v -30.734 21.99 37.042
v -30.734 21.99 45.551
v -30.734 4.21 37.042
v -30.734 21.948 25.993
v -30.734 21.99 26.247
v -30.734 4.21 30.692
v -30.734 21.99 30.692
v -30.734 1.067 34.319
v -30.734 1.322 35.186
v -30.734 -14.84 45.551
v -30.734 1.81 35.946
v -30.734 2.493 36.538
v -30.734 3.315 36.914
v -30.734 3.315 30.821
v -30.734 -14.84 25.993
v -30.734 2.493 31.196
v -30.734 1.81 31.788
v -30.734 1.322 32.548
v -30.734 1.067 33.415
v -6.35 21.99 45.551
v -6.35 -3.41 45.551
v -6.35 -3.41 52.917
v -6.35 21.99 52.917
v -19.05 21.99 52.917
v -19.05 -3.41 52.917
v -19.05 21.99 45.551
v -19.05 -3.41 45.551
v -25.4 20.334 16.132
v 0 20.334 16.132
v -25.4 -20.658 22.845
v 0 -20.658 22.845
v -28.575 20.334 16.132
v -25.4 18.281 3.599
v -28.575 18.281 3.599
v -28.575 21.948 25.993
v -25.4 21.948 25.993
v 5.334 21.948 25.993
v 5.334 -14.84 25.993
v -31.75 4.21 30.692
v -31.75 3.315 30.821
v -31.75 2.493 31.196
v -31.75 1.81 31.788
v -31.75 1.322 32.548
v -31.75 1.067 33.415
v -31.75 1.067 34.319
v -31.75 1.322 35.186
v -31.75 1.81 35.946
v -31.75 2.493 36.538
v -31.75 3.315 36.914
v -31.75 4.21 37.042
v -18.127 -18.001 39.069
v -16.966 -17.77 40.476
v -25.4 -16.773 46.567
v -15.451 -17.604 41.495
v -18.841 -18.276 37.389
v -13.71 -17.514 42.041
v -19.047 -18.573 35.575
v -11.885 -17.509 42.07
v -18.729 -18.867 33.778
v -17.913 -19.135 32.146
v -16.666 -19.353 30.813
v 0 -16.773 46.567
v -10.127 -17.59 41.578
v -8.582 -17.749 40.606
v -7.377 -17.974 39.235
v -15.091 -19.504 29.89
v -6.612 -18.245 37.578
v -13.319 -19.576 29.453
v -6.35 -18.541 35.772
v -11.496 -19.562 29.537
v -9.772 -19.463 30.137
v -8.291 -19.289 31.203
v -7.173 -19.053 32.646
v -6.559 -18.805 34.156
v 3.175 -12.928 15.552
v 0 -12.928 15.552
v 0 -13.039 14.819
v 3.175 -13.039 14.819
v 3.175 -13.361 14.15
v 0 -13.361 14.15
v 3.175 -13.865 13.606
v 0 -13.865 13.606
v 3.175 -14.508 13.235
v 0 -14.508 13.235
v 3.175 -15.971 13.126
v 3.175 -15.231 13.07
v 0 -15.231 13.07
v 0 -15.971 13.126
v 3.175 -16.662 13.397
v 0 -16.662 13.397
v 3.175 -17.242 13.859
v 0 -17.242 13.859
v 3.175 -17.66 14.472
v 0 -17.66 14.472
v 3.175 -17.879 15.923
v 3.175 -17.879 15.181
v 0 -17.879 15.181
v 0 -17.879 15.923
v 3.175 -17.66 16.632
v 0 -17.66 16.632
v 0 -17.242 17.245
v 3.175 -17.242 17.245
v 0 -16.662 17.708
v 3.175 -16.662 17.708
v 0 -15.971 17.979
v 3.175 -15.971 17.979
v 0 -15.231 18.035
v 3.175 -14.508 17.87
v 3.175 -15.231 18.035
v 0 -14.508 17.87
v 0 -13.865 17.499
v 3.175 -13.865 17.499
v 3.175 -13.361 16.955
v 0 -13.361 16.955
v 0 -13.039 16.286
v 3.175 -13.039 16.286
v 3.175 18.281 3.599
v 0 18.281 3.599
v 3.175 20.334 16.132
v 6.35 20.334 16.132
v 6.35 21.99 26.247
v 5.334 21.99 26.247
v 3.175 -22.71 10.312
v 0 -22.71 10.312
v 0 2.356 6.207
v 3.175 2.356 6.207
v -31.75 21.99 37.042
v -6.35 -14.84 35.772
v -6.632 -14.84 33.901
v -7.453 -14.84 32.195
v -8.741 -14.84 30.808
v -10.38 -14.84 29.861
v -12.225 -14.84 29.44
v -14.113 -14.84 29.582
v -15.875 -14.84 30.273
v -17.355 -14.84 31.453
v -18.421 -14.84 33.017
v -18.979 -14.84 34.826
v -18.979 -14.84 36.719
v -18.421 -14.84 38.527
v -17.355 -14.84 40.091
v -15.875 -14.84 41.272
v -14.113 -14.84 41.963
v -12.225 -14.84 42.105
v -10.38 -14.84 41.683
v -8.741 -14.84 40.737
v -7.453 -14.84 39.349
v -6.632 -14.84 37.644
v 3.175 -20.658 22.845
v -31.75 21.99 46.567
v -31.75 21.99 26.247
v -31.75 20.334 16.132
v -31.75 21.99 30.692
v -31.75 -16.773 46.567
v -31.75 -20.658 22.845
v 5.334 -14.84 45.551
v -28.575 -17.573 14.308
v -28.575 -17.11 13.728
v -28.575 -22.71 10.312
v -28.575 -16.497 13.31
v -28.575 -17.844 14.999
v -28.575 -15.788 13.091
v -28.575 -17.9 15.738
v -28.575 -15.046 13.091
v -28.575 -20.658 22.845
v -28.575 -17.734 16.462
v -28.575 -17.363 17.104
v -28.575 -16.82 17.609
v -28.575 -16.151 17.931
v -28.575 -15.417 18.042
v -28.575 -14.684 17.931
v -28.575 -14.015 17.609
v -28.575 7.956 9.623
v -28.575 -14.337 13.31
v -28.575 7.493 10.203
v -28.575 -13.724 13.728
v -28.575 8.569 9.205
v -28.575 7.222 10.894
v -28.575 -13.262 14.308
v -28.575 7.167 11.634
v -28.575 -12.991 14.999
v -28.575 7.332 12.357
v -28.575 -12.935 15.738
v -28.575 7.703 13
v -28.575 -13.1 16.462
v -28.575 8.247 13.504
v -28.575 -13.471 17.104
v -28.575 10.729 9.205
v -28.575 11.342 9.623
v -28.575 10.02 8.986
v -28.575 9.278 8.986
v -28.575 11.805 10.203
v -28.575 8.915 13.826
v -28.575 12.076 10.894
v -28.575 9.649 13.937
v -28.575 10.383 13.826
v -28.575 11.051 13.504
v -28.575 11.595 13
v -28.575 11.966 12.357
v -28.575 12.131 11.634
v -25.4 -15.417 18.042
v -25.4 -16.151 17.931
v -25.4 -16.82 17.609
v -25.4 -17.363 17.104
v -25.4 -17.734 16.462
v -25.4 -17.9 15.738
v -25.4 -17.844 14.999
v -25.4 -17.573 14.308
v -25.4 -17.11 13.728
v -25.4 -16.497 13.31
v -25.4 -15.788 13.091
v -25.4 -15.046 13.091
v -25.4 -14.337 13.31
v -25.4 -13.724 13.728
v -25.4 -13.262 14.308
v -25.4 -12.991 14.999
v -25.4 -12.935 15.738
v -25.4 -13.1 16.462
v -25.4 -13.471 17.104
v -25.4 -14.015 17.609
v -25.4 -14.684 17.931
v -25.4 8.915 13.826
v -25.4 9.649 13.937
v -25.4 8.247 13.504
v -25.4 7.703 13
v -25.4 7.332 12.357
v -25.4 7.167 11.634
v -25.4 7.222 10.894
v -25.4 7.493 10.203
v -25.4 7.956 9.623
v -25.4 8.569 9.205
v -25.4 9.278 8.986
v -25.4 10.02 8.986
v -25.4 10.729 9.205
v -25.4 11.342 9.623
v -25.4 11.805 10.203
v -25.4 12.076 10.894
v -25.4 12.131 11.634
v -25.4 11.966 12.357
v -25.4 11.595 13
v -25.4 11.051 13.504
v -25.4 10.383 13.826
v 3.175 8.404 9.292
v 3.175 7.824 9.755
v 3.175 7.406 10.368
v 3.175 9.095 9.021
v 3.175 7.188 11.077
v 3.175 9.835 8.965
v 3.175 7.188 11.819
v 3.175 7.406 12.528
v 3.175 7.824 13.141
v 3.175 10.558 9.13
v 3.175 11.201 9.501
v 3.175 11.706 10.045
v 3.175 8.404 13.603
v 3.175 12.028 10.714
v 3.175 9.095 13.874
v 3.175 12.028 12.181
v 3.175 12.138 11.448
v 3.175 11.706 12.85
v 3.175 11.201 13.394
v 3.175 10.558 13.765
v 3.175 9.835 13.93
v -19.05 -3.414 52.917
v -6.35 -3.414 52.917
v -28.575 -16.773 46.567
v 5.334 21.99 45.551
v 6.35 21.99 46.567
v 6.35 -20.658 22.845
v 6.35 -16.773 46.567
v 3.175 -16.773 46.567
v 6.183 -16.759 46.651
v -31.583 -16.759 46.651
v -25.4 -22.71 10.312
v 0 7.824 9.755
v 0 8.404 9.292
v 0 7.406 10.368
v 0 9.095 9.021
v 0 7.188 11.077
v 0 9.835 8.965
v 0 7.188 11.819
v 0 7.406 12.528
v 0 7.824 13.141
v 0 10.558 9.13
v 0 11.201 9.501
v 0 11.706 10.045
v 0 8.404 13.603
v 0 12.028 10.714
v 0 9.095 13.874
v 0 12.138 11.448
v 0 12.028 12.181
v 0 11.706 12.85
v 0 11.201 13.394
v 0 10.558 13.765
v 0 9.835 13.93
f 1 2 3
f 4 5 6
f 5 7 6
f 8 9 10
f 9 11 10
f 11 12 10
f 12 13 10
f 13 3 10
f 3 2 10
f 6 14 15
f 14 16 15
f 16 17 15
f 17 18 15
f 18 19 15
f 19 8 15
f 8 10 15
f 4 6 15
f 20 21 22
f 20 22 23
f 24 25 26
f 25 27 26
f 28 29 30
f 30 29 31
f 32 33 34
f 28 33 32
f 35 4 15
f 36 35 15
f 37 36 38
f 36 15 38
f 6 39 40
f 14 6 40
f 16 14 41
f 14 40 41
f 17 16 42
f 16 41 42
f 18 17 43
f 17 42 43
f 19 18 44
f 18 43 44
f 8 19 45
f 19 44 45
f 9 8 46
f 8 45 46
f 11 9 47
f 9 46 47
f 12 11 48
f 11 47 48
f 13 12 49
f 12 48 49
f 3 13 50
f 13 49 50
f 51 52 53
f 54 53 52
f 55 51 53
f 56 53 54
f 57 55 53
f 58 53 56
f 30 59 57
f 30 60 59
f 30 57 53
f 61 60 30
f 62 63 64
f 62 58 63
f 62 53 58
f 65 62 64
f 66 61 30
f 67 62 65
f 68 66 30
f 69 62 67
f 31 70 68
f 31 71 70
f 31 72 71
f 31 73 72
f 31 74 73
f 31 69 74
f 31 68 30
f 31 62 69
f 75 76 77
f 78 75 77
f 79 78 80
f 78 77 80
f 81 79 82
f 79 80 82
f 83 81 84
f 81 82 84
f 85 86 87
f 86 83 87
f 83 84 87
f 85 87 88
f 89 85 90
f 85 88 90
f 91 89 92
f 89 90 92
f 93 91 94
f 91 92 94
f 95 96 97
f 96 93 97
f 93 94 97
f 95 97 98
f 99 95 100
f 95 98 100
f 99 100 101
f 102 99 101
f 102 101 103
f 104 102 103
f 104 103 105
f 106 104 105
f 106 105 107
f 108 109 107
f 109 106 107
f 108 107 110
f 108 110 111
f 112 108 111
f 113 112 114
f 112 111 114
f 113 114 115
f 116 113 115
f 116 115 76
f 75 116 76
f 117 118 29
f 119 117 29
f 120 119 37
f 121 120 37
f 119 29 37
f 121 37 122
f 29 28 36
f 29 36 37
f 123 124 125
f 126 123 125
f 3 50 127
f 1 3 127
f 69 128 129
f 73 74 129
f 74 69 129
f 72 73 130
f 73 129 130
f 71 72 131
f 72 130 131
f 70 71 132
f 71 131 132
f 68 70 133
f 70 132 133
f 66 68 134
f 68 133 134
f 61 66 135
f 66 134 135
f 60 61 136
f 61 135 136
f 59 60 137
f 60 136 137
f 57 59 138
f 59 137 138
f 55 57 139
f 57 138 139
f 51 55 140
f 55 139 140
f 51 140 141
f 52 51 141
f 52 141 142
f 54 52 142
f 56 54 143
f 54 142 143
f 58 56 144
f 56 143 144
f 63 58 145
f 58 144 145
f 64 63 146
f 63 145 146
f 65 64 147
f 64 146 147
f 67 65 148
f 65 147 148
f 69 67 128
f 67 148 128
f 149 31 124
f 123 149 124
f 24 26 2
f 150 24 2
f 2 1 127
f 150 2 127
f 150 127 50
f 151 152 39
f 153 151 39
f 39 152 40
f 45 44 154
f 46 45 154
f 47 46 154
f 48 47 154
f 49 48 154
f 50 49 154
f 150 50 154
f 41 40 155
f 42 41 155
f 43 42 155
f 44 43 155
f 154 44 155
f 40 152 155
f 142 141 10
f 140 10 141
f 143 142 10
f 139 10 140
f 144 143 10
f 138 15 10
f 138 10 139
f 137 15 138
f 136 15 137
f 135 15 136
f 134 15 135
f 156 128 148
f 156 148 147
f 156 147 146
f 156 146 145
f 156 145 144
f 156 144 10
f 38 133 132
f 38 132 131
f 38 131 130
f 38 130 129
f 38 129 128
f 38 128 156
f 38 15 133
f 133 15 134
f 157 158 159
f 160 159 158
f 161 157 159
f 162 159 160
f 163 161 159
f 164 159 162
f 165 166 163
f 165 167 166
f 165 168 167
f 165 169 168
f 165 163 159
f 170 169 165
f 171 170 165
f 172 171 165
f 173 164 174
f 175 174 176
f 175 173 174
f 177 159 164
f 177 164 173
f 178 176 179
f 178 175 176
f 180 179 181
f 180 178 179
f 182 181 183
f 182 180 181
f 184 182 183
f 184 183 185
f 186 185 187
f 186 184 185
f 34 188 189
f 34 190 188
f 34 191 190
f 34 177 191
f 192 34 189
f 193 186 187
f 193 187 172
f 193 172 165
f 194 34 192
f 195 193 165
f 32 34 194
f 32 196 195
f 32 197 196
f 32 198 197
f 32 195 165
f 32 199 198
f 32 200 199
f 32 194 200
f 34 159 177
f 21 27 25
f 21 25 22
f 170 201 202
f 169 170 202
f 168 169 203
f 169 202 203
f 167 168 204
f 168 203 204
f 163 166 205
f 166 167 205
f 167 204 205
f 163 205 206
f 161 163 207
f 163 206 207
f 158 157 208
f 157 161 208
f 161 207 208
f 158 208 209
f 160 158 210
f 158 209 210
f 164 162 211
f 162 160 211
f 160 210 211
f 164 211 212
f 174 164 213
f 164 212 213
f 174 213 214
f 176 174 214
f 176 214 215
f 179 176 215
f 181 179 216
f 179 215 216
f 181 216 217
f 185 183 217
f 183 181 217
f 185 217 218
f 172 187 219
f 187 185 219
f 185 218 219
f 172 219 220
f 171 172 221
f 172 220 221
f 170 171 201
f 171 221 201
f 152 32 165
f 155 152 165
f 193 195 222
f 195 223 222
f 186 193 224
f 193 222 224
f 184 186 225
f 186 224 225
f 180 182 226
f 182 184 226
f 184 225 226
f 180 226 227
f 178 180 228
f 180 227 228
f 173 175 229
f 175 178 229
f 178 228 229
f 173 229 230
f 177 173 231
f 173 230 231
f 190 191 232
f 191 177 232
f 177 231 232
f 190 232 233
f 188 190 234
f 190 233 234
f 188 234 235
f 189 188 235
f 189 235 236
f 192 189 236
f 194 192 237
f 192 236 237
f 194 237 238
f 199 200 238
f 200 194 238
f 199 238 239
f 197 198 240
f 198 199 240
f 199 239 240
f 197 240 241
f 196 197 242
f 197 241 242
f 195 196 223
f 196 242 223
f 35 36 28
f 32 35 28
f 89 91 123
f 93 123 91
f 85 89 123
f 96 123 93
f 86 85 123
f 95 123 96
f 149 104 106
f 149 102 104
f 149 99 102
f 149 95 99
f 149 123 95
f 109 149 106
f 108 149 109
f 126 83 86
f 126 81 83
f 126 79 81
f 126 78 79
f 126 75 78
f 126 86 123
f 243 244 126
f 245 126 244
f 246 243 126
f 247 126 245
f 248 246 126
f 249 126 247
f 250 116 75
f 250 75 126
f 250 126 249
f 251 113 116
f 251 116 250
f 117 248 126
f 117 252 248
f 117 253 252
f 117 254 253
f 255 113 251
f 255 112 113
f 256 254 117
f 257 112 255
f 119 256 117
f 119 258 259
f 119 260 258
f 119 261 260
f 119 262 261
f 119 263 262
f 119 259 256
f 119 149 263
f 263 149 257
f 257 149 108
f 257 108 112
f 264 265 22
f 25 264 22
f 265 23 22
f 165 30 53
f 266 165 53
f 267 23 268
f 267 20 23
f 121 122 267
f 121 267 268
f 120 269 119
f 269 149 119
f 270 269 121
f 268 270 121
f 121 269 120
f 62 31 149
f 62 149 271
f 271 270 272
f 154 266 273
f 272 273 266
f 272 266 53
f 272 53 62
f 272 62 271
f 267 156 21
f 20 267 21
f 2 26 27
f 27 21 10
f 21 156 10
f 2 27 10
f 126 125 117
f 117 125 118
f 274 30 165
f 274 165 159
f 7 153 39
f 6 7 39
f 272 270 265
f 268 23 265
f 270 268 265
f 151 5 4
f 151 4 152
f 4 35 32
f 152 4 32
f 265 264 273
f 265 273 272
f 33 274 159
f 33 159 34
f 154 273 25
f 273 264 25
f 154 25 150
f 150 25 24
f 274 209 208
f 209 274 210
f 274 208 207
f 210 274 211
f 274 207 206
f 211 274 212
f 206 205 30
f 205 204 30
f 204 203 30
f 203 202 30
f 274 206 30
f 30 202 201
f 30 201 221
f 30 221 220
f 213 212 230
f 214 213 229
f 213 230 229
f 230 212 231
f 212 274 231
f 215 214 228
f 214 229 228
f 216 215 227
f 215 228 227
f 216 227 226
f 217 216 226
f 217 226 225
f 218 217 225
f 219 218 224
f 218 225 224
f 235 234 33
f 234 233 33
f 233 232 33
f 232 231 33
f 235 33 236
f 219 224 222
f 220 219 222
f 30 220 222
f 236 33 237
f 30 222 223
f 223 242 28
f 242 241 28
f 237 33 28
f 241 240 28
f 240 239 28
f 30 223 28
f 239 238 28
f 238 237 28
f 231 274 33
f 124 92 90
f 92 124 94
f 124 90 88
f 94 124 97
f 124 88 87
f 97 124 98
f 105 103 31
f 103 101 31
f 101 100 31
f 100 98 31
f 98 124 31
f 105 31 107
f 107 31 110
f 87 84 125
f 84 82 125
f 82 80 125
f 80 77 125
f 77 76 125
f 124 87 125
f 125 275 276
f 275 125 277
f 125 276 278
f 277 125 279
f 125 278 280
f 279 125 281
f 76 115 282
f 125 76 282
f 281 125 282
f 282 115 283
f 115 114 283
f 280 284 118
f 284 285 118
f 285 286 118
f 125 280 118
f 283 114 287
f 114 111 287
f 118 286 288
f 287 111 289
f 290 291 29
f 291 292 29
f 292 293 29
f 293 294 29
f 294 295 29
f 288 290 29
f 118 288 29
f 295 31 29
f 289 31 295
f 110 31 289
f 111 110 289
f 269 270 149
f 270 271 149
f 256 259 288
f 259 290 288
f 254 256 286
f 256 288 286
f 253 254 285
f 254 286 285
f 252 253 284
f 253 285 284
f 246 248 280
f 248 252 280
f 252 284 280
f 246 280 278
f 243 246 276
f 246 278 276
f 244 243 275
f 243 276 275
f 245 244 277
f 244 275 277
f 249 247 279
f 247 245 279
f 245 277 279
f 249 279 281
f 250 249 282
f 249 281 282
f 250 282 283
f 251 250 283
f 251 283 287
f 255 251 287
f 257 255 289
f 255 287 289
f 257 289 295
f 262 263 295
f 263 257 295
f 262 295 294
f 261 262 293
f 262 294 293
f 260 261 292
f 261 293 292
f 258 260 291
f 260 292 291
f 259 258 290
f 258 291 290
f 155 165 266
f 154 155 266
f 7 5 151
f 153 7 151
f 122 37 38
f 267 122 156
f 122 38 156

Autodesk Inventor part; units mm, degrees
ref_plane "YZ Plane Vertical Spine" through (0, 0, 0) normal (1, 0, 0) x (0, 1, 0)
ref_plane "XZ Plane Horizontal" through (0, 0, 0) normal (0, 1, 0) x (-1, 0, 0)
ref_plane "XY Plane Vertical Span" through (0, 0, 0) normal (0, 0, 1) x (1, 0, 0)
sketch "Sketch1" plane through (0, 0, 0) normal (1, 0, 0) x (0, 1, 0)
  circle A0 centre (9.6489, 11.4476) radius 2.4892
  line L0 (2.3561, 6.2073) -> (18.2812, 3.5994)
  line L1 (33.7025, 135.9395) -> (135.3025, 135.9395) construction
  line L2 (21.99, 26.2473) -> (-14.84, 26.2473)
  line L3 (4.4085, 18.7403) -> (-20.6576, 22.8451)
  line L4 (-20.6576, 22.8451) -> (-22.71, 10.312)
  line L5 (-22.71, 10.312) -> (2.3561, 6.2073)
  circle A1 centre (-15.4173, 15.5524) radius 2.4892
  line L6 (-14.84, 26.2473) -> (-14.84, 46.5673)
  line L7 (-20.6576, 22.8451) -> (-16.7225, 46.8756)
  line L8 (-16.7225, 46.8756) -> (-14.84, 46.5673)
  line L9 (21.99, 26.2473) -> (18.2812, 3.5994)
  line L10 (20.3336, 16.1325) -> (4.4085, 18.7403)
  dimension "d11" = 12.7
  dimension "d13" = 4.9784
  dimension "d14" = 20.32
extrude "Extrusion1" add sketch "Sketch1" along normal blind 3.175
sketch "Sketch2" plane through (0, 0, 0) normal (-1, 0, 0) x (0, 0, 1)
  line L0 (26.2473, 21.99) -> (26.2473, -14.84) projected
  line L1 (3.5994, 18.2812) -> (26.2473, 21.99) projected
  line L2 (26.2473, -14.84) -> (46.5673, -14.84) projected
  line L3 (46.8756, -16.7225) -> (10.312, -22.71) projected
  line L4 (16.1325, 20.3336) -> (22.8451, -20.6576)
  line L5 (16.1325, 20.3336) -> (26.2473, 21.99)
  line L6 (26.2473, 21.5334) -> (26.2473, -14.84)
  line L7 (26.2473, -14.84) -> (46.5673, -14.84)
  line L8 (46.5673, -14.84) -> (46.8756, -16.7225)
  line L9 (46.8756, -16.7225) -> (22.8451, -20.6576)
extrude "Extrusion2" add sketch "Sketch2" along normal blind 25.4
sketch "Sketch3" plane through (-25.4, 0, 0) normal (-1, 0, 0) x (0, 0, 1)
  line L0 (26.2473, -14.84) -> (26.2473, 21.99) projected
  line L1 (3.5994, 18.2812) -> (16.1325, 20.3336) projected
  line L2 (26.2473, 21.99) -> (16.1325, 20.3336) projected
  line L3 (46.5673, -14.84) -> (26.2473, -14.84) projected
  line L4 (46.8756, -16.7225) -> (46.5673, -14.84) projected
  line L5 (22.8451, -20.6576) -> (46.8756, -16.7225) projected
  line L6 (22.8451, -20.6576) -> (10.312, -22.71) projected
  line L7 (10.312, -22.71) -> (3.5994, 18.2812) projected
  circle A0 centre (15.5524, -15.4173) radius 2.4892 projected
  circle A1 centre (11.4476, 9.6489) radius 2.4892 projected
extrude "Extrusion3" add sketch "Sketch3" along normal blind 3.175
sketch "Sketch4" plane through (-28.575, 0, 0) normal (-1, 0, 0) x (0, 0, 1)
  line L0 (26.2473, 21.99) -> (3.5994, 18.2812) projected
  line L1 (26.2473, -14.84) -> (26.2473, 21.99) projected
  line L2 (46.5673, -14.84) -> (26.2473, -14.84) projected
  line L3 (46.8756, -16.7225) -> (46.5673, -14.84) projected
  line L4 (10.312, -22.71) -> (46.8756, -16.7225) projected
  line L5 (46.8756, -16.7225) -> (46.5673, -14.84) projected
  line L6 (46.5673, -14.84) -> (26.2473, -14.84) projected
  line L7 (26.2473, -14.84) -> (26.2473, 21.99) projected
  line L8 (26.2473, 21.99) -> (3.5994, 18.2812) projected
  line L9 (3.5994, 18.2812) -> (10.312, -22.71) projected
  line L10 (10.312, -22.71) -> (46.8756, -16.7225) projected
  circle A0 centre (11.4476, 9.6489) radius 2.4892 projected
  circle A1 centre (15.5524, -15.4173) radius 2.4892 projected
  line L11 (16.1325, 20.3336) -> (22.8451, -20.6576)
  line L12 (16.1325, 20.3336) -> (26.2473, 21.99)
  line L13 (26.2473, 21.99) -> (26.2473, -14.84)
  line L14 (46.5673, -14.84) -> (26.2473, -14.84)
  line L15 (46.5673, -14.84) -> (46.8756, -16.7225)
  line L16 (46.8756, -16.7225) -> (22.8451, -20.6576)
extrude "Extrusion4" add sketch "Sketch4" along normal blind 3.175 contours L1 L2 L3 L4 L11 L0
sketch "Sketch5" plane through (3.175, 0, 0) normal (1, 0, 0) x (0, 0, -1)
  line L0 (-22.8451, -20.6576) -> (-16.1325, 20.3336) projected
  line L1 (-46.8756, -16.7225) -> (-10.312, -22.71) projected
  line L2 (-26.2473, -14.84) -> (-46.5673, -14.84) projected
  line L3 (-26.2473, 21.99) -> (-26.2473, -14.84) projected
  line L4 (-3.5994, 18.2812) -> (-26.2473, 21.99) projected
  line L5 (-26.2473, 21.99) -> (-16.1325, 20.3336)
  line L6 (-16.1325, 20.3336) -> (-22.8451, -20.6576)
  line L7 (-22.8451, -20.6576) -> (-46.8756, -16.7225)
  line L8 (-46.8756, -16.7225) -> (-46.5673, -14.84)
  line L9 (-46.5673, -14.84) -> (-26.2473, -14.84)
  line L10 (-26.2473, -14.84) -> (-26.2473, 21.99)
extrude "Extrusion5" add sketch "Sketch5" along normal blind 3.175
sketch "Sketch6" plane through (-31.75, -14.84, 46.5673) normal (0, 1, 0) x (1, 0, 0)
  line L0 (38.1, 20.32) -> (38.1, 0) projected
  line L1 (0, 0) -> (0, 20.32) projected
  line L2 (0, 20.32) -> (1.27, 20.32)
  line L3 (0, 0) -> (1.27, 0)
  line L4 (1.27, 0) -> (1.27, 20.32)
  line L5 (38.1, 0) -> (38.1, 20.32)
  line L6 (38.1, 20.32) -> (36.83, 20.32)
  line L7 (36.83, 20.32) -> (36.83, 0)
  line L8 (36.83, 0) -> (38.1, 0)
  dimension "d24" = 1.27
  dimension "d25" = 1.27
  dimension "d26" = 1.27
extrude "Extrusion6" add sketch "Sketch6" along normal blind 36.83
sketch "Sketch7" plane through (-30.48, -14.84, 26.2473) normal (0, 1, 0) x (1, 0, 0)
  line L0 (0, -20.32) -> (35.56, -20.32) projected
  line L1 (0, -19.05) -> (35.56, -19.05)
  line L2 (0, -20.32) -> (35.56, -20.32)
  line L3 (35.56, -19.05) -> (35.56, -20.32)
  line L4 (0, -19.05) -> (0, -20.32)
  dimension "d29" = 1.27
extrude "Extrusion7" add sketch "Sketch7" along normal blind 11.43
sketch "Sketch8" plane through (-30.48, -14.84, 26.2473) normal (1, 0, 0) x (0, 0, -1)
  line L0 (-20.32, 11.43) -> (-20.32, 36.83) projected
  line L1 (-19.05, 11.43) -> (-19.05, 36.83)
  line L2 (-19.05, 36.83) -> (-20.32, 36.83)
  line L3 (-19.05, 11.43) -> (-20.32, 11.43)
  line L4 (-20.32, 11.43) -> (-20.32, 36.83)
  dimension "d32" = 1.27
extrude "Extrusion8" add sketch "Sketch8" along normal blind 11.43
sketch "Sketch9" plane through (5.08, -14.84, 26.2473) normal (-1, 0, 0) x (0, 0, 1)
  line L0 (20.32, 11.43) -> (20.32, 36.83) projected
  line L1 (19.0567, 11.43) -> (19.0567, 36.83)
  line L2 (19.0567, 36.83) -> (20.32, 36.83)
  line L3 (20.32, 36.83) -> (20.32, 11.43)
  line L4 (20.32, 11.43) -> (19.0567, 11.43)
extrude "Extrusion9" add sketch "Sketch9" along normal blind 11.43
sketch "Sketch10" plane through (-31.75, 0, 0) normal (-1, 0, 0) x (0, 0, 1)
  line L0 (46.5673, -14.84) -> (46.5673, 21.99) projected
  line L1 (22.8451, -20.6576) -> (46.8756, -16.7225) projected
  line L2 (46.5673, -14.84) -> (46.5673, -16.773)
  line L3 (46.5673, -16.773) -> (47.6603, -17.0438)
  line L4 (47.6603, -17.0438) -> (46.5673, -14.84)
extrude "Extrusion10" cut sketch "Sketch10" against normal blind 50.8
thicken "Thicken1" operation add thickness 6.35 both sides no extend neighbours no toward (0, 0, 1) faces at (-10.5833, -12.3187, 46.5673)
sketch "Sketch11" plane through (-31.75, 0, 0) normal (-1, 0, 0) x (0, 0, 1)
  line L0 (22.8451, -20.6576) -> (46.5673, -16.773) projected
  line L1 (46.5673, -16.773) -> (55.5301, -15.3053)
  line L2 (55.5301, -15.3053) -> (55.5301, -20.6762)
  line L3 (55.5301, -20.6762) -> (46.5673, -16.773)
extrude "Extrusion11" cut sketch "Sketch11" against normal blind 50.8
chamfer "Chamfer1" distance 6.35 distance2 12.7 1 edges at (-31.75, 3.1284, 52.9173) measured on face at (-31.75, -4.8003, 34.0032)
chamfer "Chamfer2" distance 6.35 distance2 12.7 1 edges at (6.35, 3.1284, 52.9173) measured on face at (6.35, -4.8003, 34.0032)
chamfer "Chamfer3" distance 6.35 distance2 12.319 1 edges at (-12.7, -15.7331, 52.9173) measured on face at (-14.8167, -19.0161, 32.8692)
sketch "Sketch13" plane through (-31.75, 0, 0) normal (-1, 0, 0) x (0, 0, 1)
  line L0 (26.2473, 21.99) -> (46.5673, 21.99) projected
  line L1 (37.0423, 21.99) -> (33.8673, 21.99)
  line L2 (30.6923, 21.99) -> (30.6923, 4.21)
  line L3 (37.0423, 4.21) -> (37.0423, 21.99)
  line L4 (37.0423, 21.99) -> (30.6923, 21.99)
  arc A0 (30.6923, 4.21) -> (37.0423, 4.21) centre (33.8673, 4.21) ccw
  point P0 (30.6923, 4.21)
extrude "Extrusion12" cut sketch "Sketch13" against normal blind 25.4
sketch "Sketch14" plane through (-30.48, -14.84, 26.2473) normal (0, 1, 0) x (1, 0, 0)
  line L0 (0, -19.05) -> (35.56, -19.05) projected
  line L1 (35.56, -19.05) -> (35.56, 0) projected
  line L2 (0, 0) -> (35.56, 0) projected
  line L3 (0, 0) -> (0, -19.05) projected
  line L4 (35.814, 0.254) -> (35.814, -19.304)
  line L5 (35.814, -19.304) -> (-0.254, -19.304)
  line L6 (-0.254, -19.304) -> (-0.254, 0.254)
  line L7 (-0.254, 0.254) -> (35.814, 0.254)
  dimension "d57" = 0.254
extrude "Extrusion13" cut sketch "Sketch14" along normal blind 50.8 contours L3 L2 L1 L0 | L4 L5 L6 L7
sketch "Sketch15" plane through (-30.734, -14.84, 45.5513) normal (0, 1, 0) x (1, 0, 0)
  line L0 (0, 19.558) -> (0, 0) projected
  line L1 (0, 0) -> (36.068, 0) projected
  line L2 (36.068, 0) -> (36.068, 19.558) projected
  line L3 (36.068, 19.558) -> (0, 19.558) projected
  line L4 (0, 9.779) -> (36.068, 9.779)
  line L5 (18.034, 0) -> (18.034, 19.558)
  circle A0 centre (18.034, 9.779) radius 6.35
  dimension "d60" = 12.7
extrude "Extrusion14" cut sketch "Sketch15" against normal blind 50.8 contours A0 L5 L4 | L4 L5 A0 | A0 L4 L5 | L4 A0 L5
properties part number "back_mount_3DPrint"
